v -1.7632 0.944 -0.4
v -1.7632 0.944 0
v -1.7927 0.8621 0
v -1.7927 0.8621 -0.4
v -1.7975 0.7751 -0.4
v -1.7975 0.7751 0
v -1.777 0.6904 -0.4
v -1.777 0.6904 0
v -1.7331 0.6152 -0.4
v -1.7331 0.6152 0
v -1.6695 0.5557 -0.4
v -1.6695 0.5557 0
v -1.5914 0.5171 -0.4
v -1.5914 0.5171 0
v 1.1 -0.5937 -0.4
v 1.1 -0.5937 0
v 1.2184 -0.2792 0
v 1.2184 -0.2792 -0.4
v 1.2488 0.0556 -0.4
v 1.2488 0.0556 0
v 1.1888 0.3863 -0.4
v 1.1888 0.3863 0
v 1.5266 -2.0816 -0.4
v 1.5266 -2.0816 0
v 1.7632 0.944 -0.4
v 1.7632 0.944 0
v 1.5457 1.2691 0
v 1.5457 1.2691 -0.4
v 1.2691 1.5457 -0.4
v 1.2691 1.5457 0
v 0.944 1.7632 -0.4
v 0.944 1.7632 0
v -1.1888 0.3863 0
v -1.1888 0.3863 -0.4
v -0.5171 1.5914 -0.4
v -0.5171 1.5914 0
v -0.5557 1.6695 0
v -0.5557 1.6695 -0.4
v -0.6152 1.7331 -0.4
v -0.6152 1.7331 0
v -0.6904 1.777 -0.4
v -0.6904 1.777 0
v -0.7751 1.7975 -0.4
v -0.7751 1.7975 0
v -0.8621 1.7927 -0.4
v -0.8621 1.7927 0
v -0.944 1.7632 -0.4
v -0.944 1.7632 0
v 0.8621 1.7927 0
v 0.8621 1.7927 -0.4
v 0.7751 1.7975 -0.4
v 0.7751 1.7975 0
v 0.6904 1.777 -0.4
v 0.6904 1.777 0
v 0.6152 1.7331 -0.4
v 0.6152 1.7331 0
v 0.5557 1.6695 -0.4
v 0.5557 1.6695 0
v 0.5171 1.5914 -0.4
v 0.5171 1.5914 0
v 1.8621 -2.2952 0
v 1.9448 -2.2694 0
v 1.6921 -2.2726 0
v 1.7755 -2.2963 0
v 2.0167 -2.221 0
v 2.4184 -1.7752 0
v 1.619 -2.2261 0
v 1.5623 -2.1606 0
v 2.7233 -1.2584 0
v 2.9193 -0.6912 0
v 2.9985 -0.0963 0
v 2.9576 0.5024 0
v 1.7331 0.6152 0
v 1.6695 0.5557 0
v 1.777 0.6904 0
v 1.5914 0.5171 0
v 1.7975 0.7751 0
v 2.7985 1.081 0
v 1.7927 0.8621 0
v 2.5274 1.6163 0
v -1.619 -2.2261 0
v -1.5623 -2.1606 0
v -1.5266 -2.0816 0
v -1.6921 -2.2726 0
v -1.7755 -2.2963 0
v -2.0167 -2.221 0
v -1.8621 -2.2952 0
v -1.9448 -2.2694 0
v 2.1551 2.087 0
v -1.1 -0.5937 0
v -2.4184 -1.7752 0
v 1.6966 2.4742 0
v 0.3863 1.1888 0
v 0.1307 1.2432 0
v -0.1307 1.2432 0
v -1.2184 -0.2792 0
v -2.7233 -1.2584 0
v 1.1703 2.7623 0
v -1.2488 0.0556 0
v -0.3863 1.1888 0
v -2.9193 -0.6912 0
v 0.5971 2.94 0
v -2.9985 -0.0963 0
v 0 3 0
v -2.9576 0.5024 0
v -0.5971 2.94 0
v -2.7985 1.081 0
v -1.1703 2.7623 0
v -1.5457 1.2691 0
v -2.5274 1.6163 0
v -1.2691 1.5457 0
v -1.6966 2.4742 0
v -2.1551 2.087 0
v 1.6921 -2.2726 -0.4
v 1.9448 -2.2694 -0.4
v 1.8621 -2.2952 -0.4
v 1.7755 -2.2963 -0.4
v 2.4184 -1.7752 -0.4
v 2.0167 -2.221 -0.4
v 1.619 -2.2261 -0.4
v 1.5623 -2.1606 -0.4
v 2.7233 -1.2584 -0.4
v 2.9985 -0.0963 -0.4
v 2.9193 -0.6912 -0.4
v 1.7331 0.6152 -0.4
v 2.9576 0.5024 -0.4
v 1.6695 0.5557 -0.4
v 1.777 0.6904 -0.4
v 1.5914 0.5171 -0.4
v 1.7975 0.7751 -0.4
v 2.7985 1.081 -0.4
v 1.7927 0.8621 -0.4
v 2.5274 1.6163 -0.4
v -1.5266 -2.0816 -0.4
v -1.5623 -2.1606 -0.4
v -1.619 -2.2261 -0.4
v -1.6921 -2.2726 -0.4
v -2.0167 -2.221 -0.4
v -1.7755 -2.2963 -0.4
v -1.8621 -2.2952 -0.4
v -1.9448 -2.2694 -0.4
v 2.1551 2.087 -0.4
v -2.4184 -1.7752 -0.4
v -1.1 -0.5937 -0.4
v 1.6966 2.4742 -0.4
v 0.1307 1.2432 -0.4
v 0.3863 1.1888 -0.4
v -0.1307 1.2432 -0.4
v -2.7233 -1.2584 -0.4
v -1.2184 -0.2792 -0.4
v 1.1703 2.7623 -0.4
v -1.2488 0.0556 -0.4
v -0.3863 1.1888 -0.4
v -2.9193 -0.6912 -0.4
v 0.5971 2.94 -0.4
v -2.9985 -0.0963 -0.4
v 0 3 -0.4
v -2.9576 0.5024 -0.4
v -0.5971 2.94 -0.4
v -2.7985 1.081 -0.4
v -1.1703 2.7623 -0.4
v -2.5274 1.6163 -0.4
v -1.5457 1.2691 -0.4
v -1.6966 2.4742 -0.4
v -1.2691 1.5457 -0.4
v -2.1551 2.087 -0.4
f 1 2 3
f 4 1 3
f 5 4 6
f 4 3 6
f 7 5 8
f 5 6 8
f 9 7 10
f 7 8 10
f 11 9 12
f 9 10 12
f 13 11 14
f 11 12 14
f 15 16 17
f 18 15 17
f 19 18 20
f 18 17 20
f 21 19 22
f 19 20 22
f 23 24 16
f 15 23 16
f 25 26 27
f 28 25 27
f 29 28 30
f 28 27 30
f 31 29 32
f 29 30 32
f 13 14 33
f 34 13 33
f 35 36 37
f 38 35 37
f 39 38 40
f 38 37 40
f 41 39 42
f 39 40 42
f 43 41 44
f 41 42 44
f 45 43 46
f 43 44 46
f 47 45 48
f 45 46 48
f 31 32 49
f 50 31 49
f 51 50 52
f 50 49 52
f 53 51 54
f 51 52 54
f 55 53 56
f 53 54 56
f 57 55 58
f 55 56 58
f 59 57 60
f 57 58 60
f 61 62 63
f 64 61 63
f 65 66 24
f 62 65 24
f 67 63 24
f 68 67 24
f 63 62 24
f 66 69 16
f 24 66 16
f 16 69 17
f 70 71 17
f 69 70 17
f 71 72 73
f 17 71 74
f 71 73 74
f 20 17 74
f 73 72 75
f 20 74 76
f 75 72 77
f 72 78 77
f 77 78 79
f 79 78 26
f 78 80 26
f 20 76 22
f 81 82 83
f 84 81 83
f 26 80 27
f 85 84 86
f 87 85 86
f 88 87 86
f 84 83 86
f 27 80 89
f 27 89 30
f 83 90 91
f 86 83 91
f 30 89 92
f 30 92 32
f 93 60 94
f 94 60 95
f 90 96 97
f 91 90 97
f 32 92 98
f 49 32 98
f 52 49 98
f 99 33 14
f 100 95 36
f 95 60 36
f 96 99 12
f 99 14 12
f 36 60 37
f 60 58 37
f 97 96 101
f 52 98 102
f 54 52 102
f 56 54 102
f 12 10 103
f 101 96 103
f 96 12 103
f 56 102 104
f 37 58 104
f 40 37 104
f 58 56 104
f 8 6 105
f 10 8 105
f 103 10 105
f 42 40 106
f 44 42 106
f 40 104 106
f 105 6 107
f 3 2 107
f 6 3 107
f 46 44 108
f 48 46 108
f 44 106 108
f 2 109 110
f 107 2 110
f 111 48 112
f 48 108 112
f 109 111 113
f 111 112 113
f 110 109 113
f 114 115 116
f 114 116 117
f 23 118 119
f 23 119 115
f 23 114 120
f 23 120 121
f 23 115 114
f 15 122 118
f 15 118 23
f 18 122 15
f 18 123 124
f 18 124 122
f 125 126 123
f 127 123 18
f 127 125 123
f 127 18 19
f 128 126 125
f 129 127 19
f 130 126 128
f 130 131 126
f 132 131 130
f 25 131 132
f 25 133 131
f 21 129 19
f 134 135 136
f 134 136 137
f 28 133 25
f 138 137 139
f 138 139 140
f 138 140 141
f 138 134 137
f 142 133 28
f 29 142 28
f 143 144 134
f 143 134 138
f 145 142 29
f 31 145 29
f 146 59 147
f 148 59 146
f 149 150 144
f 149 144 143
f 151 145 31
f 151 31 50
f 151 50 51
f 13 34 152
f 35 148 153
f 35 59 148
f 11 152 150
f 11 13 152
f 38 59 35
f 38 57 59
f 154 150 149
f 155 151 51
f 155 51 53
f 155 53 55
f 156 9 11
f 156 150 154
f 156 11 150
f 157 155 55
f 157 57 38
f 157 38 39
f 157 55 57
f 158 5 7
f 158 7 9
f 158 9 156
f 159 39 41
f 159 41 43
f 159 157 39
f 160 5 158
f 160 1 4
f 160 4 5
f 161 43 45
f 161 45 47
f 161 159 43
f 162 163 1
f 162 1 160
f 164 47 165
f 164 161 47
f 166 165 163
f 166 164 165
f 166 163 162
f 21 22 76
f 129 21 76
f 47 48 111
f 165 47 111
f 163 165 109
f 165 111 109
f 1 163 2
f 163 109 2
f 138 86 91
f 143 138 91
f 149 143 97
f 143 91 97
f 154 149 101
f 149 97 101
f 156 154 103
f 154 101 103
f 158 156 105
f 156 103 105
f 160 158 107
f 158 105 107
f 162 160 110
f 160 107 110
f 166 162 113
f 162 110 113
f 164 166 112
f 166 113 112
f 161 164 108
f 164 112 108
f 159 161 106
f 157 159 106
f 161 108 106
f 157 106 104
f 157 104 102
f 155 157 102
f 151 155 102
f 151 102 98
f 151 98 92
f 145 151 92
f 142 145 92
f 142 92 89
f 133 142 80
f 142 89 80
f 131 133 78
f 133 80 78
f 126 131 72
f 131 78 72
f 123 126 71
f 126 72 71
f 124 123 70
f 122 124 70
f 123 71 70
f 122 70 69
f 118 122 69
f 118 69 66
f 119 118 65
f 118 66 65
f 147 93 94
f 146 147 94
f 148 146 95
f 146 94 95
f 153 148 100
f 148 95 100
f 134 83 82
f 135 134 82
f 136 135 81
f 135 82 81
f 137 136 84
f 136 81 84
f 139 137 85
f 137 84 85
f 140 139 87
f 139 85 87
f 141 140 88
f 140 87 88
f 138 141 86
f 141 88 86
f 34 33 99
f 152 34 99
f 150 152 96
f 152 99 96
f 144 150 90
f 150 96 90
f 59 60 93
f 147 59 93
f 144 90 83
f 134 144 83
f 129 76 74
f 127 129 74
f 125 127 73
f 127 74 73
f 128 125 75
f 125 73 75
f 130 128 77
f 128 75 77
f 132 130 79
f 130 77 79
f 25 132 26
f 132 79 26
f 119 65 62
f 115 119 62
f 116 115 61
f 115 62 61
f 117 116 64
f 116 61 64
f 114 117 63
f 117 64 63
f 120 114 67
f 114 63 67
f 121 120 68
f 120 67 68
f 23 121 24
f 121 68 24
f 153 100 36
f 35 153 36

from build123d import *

# Parameters (mm, degrees)
BODY_DEPTH = 0.4


with BuildPart() as part:
    # Sketch1 → Body (new body)
    with BuildSketch(Plane.XY):
        with BuildLine():
            Line((0.517084333, 1.59142194), (0.386271243, 1.188820645))
            ThreePointArc((0.386271243, 1.188820645), (0, 1.25), (-0.386271243, 1.188820645))
            Line((-0.386271243, 1.188820645), (-0.517084333, 1.59142194))
            ThreePointArc((-0.517084333, 1.59142194), (-0.690418116, 1.777032794), (-0.944001516, 1.763196285))
            ThreePointArc((-0.944001516, 1.763196285), (-1.414213562, 1.414213562), (-1.763196285, 0.944001516))
            ThreePointArc((-1.763196285, 0.944001516), (-1.777032794, 0.690418116), (-1.59142194, 0.517084333))
            Line((-1.59142194, 0.517084333), (-1.188820645, 0.386271243))
            ThreePointArc((-1.188820645, 0.386271243), (-1.244897296, -0.112830506), (-1.1, -0.593717104))
            Line((-1.1, -0.593717104), (-1.526646887, -2.081611619))
            ThreePointArc((-1.526646887, -2.081611619), (-1.732937183, -2.287471145), (-2.016694884, -2.22102268))
            ThreePointArc((-2.016694884, -2.22102268), (0, 3), (2.016694884, -2.22102268))
            ThreePointArc((2.016694884, -2.22102268), (1.732937183, -2.287471145), (1.526646887, -2.081611619))
            Line((1.526646887, -2.081611619), (1.1, -0.593717104))
            ThreePointArc((1.1, -0.593717104), (1.244897296, -0.112830506), (1.188820645, 0.386271243))
            Line((1.188820645, 0.386271243), (1.59142194, 0.517084333))
            ThreePointArc((1.59142194, 0.517084333), (1.777032794, 0.690418116), (1.763196285, 0.944001516))
            ThreePointArc((1.763196285, 0.944001516), (1.414213562, 1.414213562), (0.944001516, 1.763196285))
            ThreePointArc((0.944001516, 1.763196285), (0.690418116, 1.777032794), (0.517084333, 1.59142194))
        make_face()
    extrude(amount=-BODY_DEPTH)


solid = part.part
